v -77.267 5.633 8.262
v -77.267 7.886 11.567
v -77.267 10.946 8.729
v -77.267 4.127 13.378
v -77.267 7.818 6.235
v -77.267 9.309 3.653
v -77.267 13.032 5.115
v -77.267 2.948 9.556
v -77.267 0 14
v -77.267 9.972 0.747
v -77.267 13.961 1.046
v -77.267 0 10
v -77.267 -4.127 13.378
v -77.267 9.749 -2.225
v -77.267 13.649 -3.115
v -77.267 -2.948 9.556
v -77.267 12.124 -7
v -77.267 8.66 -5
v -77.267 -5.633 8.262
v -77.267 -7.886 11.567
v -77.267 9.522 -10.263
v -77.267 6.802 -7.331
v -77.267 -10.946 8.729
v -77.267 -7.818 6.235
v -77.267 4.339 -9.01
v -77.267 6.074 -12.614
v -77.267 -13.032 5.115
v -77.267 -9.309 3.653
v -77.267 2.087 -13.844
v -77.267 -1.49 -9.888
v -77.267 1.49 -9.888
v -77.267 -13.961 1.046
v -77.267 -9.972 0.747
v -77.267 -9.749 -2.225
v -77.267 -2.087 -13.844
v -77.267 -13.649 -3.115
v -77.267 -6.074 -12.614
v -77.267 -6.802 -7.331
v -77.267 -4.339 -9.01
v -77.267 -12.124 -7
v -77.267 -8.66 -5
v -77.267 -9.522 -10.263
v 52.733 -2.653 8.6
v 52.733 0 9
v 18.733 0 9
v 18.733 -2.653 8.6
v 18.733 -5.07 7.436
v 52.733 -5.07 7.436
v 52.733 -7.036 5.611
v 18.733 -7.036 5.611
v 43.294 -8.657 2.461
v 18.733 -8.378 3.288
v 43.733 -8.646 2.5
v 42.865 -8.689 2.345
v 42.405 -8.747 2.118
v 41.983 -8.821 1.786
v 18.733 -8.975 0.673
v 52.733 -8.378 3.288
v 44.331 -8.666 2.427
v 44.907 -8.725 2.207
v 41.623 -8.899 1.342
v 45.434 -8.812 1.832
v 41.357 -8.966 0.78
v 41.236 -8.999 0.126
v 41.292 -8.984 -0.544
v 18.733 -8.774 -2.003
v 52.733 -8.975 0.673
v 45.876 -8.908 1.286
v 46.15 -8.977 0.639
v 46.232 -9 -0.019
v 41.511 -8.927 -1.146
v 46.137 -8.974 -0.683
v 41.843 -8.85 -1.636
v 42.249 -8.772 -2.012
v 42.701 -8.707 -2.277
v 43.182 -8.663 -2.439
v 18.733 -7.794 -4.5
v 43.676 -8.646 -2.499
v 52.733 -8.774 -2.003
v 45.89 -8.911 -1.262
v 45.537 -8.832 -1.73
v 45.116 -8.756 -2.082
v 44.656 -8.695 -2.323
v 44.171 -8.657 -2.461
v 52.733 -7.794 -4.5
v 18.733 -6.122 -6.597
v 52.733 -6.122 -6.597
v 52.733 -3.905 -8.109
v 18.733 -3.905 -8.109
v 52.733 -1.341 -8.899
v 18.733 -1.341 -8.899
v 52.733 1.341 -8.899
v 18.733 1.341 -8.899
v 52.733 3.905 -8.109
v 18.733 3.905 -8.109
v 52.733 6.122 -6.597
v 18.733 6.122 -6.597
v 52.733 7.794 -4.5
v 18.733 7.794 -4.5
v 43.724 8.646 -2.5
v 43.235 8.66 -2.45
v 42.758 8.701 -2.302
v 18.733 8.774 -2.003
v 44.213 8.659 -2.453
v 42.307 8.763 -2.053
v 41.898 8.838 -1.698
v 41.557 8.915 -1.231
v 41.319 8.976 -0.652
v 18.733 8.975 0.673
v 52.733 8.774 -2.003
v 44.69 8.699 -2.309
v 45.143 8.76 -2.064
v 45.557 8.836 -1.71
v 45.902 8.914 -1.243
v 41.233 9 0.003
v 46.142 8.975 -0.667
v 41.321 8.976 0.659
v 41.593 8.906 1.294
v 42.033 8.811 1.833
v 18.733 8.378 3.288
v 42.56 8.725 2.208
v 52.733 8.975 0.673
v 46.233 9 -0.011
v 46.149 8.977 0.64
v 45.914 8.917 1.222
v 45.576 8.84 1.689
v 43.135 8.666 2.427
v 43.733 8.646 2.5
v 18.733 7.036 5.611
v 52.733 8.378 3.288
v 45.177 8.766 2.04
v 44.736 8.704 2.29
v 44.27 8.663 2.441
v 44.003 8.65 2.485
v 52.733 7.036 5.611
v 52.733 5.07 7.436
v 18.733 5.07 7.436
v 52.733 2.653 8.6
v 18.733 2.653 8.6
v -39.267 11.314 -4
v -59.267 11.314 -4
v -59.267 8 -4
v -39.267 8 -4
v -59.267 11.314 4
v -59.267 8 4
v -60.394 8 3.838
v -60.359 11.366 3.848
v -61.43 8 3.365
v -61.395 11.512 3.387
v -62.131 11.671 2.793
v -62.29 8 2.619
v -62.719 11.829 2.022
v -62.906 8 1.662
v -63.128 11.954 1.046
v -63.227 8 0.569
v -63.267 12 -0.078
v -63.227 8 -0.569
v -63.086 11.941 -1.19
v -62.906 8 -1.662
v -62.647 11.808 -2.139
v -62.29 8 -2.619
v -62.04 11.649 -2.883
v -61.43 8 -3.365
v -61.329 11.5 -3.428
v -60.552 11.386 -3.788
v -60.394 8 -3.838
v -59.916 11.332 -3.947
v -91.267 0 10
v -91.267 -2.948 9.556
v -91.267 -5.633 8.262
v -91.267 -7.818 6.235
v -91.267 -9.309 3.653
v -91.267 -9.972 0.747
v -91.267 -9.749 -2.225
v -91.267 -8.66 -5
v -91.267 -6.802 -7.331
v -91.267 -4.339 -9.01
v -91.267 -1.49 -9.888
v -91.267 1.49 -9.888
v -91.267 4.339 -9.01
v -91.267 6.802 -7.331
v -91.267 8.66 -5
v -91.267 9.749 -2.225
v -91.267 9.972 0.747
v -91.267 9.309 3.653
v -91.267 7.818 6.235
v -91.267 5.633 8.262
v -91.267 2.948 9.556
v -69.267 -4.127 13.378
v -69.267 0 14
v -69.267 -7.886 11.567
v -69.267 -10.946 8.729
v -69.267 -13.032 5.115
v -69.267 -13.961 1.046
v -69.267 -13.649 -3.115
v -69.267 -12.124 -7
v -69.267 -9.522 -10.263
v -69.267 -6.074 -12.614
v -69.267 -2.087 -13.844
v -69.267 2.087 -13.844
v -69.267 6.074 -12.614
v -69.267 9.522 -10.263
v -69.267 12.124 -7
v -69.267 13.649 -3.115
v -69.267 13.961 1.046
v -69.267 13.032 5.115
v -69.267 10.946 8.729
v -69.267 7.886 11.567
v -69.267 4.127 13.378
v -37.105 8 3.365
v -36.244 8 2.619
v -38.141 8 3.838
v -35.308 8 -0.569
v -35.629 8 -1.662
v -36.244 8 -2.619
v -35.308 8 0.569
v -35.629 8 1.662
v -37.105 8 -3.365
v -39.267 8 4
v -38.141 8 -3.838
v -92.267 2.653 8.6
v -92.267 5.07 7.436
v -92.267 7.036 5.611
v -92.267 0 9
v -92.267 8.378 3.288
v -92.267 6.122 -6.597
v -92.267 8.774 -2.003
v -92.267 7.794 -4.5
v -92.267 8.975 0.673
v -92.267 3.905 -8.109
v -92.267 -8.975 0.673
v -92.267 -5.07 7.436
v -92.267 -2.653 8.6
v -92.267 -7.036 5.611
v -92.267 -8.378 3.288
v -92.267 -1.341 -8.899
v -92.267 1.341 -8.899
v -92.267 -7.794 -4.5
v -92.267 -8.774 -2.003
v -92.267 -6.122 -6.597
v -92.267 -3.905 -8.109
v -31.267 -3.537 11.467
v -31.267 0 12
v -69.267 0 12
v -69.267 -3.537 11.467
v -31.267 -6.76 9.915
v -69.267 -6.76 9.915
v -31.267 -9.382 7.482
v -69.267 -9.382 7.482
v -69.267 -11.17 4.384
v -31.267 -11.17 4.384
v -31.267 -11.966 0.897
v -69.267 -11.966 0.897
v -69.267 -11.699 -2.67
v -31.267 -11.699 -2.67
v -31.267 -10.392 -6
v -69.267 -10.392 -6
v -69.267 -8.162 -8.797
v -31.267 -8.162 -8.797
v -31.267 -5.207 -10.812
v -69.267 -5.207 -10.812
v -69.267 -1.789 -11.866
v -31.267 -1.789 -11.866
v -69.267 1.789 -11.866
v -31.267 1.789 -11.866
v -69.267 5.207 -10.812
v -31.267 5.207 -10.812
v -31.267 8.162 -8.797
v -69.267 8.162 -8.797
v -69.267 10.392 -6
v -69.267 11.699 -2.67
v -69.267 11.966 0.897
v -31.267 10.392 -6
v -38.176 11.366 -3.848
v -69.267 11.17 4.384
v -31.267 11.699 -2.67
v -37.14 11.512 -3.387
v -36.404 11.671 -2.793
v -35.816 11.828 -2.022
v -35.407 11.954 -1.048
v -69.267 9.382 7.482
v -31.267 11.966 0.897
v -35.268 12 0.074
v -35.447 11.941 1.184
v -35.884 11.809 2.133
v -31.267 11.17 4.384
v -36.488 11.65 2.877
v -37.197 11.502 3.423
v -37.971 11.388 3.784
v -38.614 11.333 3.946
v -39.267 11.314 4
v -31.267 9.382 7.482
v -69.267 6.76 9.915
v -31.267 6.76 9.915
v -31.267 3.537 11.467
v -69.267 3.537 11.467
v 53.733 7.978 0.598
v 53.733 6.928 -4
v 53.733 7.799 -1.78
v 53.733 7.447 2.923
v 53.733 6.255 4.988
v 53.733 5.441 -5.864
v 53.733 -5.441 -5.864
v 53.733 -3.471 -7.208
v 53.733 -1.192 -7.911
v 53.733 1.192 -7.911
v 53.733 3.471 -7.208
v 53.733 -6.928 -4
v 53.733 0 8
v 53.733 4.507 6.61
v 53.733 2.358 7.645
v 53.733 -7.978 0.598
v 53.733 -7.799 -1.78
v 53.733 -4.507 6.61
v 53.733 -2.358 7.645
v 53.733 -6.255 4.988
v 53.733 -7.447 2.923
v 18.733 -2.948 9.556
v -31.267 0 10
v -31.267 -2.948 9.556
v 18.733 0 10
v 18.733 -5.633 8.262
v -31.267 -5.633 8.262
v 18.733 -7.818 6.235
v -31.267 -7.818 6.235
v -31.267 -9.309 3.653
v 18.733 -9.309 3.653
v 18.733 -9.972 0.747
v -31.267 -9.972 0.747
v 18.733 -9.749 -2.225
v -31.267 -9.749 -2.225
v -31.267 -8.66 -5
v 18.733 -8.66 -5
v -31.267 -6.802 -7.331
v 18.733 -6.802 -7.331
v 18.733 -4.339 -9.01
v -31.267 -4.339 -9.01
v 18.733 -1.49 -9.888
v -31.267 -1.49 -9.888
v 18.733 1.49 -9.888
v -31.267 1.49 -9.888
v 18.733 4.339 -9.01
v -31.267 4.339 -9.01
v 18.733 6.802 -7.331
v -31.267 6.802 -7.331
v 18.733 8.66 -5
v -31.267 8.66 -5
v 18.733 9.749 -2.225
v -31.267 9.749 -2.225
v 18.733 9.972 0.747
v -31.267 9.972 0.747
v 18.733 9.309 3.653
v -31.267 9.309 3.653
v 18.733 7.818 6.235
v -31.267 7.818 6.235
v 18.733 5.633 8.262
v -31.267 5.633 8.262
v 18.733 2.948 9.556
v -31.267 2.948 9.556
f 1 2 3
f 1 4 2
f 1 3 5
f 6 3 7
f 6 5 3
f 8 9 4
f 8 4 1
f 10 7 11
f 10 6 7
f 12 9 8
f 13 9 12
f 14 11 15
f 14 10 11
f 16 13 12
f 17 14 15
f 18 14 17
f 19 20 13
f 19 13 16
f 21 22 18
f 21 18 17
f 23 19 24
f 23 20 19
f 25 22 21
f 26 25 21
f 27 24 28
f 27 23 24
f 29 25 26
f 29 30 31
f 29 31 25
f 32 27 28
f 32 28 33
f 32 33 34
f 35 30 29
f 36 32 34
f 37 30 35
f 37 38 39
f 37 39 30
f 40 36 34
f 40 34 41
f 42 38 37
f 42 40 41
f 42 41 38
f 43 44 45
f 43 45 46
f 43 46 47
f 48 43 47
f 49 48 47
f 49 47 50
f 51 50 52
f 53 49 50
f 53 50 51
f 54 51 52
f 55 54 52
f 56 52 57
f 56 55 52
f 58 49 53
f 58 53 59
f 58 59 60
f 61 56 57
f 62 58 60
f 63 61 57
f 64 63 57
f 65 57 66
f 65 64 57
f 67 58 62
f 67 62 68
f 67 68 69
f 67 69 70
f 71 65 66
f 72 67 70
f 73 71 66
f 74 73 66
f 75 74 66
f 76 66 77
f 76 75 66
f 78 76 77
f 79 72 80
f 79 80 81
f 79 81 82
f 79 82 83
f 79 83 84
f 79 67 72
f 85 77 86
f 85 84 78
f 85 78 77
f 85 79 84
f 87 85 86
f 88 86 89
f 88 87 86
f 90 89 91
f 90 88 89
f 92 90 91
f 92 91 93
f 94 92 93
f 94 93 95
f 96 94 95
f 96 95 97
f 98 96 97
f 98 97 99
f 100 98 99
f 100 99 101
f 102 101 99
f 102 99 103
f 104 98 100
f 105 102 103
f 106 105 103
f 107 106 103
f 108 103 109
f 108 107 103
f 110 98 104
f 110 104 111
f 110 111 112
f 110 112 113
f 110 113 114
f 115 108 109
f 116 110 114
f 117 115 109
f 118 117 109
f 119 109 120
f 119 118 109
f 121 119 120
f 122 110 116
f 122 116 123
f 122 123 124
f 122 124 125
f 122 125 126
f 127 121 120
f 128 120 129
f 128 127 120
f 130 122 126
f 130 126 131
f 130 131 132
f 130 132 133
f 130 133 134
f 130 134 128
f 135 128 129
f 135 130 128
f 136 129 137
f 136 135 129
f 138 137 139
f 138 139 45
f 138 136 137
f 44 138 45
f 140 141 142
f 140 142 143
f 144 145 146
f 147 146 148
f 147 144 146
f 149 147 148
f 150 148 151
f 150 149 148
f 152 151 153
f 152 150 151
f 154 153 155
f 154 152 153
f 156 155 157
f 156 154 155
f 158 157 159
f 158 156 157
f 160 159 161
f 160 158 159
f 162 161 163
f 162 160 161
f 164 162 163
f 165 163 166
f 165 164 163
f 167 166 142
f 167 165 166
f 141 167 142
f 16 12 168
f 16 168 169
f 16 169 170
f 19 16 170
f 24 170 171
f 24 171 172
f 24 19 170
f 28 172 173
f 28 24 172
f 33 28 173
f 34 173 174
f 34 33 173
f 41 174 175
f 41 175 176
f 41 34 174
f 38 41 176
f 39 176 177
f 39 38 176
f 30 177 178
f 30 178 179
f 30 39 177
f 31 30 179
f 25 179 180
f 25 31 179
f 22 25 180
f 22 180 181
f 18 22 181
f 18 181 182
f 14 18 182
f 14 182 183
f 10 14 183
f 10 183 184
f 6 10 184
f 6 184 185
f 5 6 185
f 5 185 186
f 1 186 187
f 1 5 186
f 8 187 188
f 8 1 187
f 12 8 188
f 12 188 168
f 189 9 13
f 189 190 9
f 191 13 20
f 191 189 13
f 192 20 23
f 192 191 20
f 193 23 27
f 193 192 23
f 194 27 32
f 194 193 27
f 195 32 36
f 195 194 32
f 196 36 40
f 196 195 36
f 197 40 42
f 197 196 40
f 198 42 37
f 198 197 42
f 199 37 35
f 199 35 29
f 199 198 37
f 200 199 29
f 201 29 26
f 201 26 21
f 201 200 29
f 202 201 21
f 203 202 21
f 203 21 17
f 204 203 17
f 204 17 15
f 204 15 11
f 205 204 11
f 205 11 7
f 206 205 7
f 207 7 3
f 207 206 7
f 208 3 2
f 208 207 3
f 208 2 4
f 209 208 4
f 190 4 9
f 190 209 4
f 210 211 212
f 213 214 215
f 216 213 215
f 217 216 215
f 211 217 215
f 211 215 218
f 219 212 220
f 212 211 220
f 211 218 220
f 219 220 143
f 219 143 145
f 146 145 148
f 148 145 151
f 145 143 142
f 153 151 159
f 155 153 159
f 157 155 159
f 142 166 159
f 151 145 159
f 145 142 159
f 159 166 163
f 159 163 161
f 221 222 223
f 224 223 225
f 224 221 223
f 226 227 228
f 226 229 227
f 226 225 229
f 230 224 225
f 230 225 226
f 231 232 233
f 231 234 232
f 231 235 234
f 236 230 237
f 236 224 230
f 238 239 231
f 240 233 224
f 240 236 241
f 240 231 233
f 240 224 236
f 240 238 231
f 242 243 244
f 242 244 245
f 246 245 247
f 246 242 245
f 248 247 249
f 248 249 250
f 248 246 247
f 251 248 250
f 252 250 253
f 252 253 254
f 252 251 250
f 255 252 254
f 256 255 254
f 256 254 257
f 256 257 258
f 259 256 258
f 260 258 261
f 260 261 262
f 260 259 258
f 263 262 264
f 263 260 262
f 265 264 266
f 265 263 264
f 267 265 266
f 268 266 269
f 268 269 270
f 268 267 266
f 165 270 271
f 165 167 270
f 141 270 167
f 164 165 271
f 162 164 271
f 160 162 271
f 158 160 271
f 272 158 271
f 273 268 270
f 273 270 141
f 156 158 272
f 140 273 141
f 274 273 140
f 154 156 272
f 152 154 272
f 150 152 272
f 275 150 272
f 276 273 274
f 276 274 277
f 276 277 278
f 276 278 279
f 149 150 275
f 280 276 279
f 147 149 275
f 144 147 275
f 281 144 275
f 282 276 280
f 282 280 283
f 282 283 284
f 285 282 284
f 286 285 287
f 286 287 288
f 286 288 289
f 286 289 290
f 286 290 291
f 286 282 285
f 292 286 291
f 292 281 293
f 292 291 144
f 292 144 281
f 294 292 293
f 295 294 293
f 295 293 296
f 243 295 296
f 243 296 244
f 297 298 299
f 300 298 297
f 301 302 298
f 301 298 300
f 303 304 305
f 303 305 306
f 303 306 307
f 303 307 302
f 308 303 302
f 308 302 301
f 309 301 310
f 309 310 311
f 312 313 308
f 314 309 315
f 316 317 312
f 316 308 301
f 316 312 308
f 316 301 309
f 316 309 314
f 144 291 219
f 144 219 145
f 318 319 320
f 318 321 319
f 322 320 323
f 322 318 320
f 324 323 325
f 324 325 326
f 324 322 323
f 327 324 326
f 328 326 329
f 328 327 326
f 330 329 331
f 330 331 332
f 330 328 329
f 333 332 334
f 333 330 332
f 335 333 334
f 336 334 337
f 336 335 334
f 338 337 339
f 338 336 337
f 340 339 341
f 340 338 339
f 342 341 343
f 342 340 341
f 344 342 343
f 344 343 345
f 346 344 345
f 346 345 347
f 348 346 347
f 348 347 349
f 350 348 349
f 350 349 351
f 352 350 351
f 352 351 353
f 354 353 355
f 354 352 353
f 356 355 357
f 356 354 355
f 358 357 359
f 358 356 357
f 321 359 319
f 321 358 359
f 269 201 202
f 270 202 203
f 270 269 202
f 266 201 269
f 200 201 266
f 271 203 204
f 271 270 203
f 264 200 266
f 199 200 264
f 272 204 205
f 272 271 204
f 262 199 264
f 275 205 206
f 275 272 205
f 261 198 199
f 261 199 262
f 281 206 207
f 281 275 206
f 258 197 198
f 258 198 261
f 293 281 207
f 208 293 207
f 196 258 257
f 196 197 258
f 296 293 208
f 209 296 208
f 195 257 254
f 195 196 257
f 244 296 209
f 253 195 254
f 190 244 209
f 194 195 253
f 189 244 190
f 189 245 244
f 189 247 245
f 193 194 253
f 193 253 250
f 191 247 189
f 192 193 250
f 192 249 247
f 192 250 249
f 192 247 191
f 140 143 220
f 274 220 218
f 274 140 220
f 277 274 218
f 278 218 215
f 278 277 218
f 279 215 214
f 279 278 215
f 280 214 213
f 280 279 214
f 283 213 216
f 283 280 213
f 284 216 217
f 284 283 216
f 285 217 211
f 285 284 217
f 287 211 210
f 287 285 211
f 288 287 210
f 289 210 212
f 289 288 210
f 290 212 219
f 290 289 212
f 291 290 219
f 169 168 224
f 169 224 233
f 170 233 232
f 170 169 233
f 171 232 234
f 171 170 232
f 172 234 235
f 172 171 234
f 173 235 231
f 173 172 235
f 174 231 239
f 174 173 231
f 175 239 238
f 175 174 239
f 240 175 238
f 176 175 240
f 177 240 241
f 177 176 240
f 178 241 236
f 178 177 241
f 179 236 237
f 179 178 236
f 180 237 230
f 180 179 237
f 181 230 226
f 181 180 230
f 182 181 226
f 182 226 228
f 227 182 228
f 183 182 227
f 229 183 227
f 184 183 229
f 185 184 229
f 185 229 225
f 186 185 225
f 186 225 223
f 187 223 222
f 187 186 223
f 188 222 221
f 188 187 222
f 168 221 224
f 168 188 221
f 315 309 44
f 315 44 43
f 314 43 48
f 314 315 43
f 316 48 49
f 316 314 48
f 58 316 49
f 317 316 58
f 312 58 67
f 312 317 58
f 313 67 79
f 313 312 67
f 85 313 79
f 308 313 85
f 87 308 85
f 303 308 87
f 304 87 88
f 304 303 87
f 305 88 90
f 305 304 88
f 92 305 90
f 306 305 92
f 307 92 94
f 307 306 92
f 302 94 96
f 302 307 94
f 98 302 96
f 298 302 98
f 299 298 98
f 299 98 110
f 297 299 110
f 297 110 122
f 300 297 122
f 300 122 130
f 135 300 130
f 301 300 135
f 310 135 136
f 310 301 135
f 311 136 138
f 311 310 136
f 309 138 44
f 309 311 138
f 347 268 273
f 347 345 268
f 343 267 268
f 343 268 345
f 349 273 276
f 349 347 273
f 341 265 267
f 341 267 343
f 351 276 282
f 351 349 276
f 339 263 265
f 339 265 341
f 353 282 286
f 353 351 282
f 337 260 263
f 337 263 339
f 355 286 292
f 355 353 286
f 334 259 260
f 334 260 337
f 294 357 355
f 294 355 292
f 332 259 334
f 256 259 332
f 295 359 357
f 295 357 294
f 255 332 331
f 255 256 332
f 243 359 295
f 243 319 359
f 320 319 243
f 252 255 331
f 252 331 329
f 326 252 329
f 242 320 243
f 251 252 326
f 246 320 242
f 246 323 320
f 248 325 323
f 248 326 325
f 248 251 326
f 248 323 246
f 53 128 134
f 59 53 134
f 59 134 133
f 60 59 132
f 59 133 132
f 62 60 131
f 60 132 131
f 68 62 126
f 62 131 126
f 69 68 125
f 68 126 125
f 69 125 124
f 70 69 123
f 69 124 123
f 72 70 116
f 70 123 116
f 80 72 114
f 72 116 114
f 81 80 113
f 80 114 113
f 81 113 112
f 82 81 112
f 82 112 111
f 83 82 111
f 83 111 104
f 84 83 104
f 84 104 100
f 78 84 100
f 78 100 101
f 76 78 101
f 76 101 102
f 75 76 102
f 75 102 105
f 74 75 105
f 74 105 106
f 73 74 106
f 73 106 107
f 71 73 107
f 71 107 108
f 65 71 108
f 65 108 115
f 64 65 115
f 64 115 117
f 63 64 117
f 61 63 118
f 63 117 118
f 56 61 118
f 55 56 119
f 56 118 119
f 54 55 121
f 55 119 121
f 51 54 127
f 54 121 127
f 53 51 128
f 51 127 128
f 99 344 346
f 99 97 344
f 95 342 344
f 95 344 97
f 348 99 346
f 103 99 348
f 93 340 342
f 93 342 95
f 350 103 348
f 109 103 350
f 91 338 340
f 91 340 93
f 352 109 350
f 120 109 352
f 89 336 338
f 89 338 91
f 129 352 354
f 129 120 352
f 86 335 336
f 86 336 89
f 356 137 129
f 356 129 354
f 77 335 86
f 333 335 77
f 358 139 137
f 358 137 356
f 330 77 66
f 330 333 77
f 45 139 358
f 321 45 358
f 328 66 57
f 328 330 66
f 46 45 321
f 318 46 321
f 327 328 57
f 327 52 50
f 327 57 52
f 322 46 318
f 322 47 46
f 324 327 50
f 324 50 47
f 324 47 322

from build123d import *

# Parameters (mm, degrees)
CHAMFER1_SIZE      = 1
SKETCH2_R          = 2.5
CUT_EXTRUDE1_DEPTH = 97.115975922
CUT_EXTRUDE2_DEPTH = 4


with BuildPart() as part:
    # Sketch1 → Revolve1 (revolve)
    with BuildSketch(Plane.XY, mode=Mode.PRIVATE) as revolve1_sk:
        Polygon((-92.26744186, 0), (-92.26744186, 10), (-77.26744186, 10), (-77.26744186, 14), (-69.26744186, 14), (-69.26744186, 12), (-31.26744186, 12), (-31.26744186, 10), (18.73255814, 10), (18.73255814, 9), (53.73255814, 9), (53.73255814, 0), align=None)
    revolve(revolve1_sk.sketch.rotate(Axis((-99.418604651, 0, 0), (1, 0, 0)), 90), axis=Axis((-99.418604651, 0, 0), (1, 0, 0)))

    # Chamfer1
    chamfer1_edges = [part.edges().sort_by_distance(p)[0] for p in [
        (-92.26744186, 0, -10),
        (53.73255814, 0, -9),
    ]]
    chamfer(chamfer1_edges, length=CHAMFER1_SIZE)

    # Sketch2 → Cut-Extrude1 (cut, through all)
    with BuildSketch(Plane(origin=(0, 9, 0), x_dir=(1, 0, 0), z_dir=(0, 1, 0))):
        with Locations(Location((43.73255814, 0, 0), (0, 0, 270))):
            Circle(SKETCH2_R)
    extrude(amount=-CUT_EXTRUDE1_DEPTH, mode=Mode.SUBTRACT)

    # Sketch3 → Cut-Extrude2 (cut)
    with BuildSketch(Plane(origin=(0, 12, 0), x_dir=(1, 0, 0), z_dir=(0, 1, 0))):
        with BuildLine():
            Line((-59.26744186, 4), (-39.26744186, 4))
            ThreePointArc((-39.26744186, 4), (-35.26744186, 0), (-39.26744186, -4))
            Line((-39.26744186, -4), (-59.26744186, -4))
            ThreePointArc((-59.26744186, -4), (-63.26744186, 0), (-59.26744186, 4))
        make_face()
    extrude(amount=-CUT_EXTRUDE2_DEPTH, mode=Mode.SUBTRACT)


solid = part.part
